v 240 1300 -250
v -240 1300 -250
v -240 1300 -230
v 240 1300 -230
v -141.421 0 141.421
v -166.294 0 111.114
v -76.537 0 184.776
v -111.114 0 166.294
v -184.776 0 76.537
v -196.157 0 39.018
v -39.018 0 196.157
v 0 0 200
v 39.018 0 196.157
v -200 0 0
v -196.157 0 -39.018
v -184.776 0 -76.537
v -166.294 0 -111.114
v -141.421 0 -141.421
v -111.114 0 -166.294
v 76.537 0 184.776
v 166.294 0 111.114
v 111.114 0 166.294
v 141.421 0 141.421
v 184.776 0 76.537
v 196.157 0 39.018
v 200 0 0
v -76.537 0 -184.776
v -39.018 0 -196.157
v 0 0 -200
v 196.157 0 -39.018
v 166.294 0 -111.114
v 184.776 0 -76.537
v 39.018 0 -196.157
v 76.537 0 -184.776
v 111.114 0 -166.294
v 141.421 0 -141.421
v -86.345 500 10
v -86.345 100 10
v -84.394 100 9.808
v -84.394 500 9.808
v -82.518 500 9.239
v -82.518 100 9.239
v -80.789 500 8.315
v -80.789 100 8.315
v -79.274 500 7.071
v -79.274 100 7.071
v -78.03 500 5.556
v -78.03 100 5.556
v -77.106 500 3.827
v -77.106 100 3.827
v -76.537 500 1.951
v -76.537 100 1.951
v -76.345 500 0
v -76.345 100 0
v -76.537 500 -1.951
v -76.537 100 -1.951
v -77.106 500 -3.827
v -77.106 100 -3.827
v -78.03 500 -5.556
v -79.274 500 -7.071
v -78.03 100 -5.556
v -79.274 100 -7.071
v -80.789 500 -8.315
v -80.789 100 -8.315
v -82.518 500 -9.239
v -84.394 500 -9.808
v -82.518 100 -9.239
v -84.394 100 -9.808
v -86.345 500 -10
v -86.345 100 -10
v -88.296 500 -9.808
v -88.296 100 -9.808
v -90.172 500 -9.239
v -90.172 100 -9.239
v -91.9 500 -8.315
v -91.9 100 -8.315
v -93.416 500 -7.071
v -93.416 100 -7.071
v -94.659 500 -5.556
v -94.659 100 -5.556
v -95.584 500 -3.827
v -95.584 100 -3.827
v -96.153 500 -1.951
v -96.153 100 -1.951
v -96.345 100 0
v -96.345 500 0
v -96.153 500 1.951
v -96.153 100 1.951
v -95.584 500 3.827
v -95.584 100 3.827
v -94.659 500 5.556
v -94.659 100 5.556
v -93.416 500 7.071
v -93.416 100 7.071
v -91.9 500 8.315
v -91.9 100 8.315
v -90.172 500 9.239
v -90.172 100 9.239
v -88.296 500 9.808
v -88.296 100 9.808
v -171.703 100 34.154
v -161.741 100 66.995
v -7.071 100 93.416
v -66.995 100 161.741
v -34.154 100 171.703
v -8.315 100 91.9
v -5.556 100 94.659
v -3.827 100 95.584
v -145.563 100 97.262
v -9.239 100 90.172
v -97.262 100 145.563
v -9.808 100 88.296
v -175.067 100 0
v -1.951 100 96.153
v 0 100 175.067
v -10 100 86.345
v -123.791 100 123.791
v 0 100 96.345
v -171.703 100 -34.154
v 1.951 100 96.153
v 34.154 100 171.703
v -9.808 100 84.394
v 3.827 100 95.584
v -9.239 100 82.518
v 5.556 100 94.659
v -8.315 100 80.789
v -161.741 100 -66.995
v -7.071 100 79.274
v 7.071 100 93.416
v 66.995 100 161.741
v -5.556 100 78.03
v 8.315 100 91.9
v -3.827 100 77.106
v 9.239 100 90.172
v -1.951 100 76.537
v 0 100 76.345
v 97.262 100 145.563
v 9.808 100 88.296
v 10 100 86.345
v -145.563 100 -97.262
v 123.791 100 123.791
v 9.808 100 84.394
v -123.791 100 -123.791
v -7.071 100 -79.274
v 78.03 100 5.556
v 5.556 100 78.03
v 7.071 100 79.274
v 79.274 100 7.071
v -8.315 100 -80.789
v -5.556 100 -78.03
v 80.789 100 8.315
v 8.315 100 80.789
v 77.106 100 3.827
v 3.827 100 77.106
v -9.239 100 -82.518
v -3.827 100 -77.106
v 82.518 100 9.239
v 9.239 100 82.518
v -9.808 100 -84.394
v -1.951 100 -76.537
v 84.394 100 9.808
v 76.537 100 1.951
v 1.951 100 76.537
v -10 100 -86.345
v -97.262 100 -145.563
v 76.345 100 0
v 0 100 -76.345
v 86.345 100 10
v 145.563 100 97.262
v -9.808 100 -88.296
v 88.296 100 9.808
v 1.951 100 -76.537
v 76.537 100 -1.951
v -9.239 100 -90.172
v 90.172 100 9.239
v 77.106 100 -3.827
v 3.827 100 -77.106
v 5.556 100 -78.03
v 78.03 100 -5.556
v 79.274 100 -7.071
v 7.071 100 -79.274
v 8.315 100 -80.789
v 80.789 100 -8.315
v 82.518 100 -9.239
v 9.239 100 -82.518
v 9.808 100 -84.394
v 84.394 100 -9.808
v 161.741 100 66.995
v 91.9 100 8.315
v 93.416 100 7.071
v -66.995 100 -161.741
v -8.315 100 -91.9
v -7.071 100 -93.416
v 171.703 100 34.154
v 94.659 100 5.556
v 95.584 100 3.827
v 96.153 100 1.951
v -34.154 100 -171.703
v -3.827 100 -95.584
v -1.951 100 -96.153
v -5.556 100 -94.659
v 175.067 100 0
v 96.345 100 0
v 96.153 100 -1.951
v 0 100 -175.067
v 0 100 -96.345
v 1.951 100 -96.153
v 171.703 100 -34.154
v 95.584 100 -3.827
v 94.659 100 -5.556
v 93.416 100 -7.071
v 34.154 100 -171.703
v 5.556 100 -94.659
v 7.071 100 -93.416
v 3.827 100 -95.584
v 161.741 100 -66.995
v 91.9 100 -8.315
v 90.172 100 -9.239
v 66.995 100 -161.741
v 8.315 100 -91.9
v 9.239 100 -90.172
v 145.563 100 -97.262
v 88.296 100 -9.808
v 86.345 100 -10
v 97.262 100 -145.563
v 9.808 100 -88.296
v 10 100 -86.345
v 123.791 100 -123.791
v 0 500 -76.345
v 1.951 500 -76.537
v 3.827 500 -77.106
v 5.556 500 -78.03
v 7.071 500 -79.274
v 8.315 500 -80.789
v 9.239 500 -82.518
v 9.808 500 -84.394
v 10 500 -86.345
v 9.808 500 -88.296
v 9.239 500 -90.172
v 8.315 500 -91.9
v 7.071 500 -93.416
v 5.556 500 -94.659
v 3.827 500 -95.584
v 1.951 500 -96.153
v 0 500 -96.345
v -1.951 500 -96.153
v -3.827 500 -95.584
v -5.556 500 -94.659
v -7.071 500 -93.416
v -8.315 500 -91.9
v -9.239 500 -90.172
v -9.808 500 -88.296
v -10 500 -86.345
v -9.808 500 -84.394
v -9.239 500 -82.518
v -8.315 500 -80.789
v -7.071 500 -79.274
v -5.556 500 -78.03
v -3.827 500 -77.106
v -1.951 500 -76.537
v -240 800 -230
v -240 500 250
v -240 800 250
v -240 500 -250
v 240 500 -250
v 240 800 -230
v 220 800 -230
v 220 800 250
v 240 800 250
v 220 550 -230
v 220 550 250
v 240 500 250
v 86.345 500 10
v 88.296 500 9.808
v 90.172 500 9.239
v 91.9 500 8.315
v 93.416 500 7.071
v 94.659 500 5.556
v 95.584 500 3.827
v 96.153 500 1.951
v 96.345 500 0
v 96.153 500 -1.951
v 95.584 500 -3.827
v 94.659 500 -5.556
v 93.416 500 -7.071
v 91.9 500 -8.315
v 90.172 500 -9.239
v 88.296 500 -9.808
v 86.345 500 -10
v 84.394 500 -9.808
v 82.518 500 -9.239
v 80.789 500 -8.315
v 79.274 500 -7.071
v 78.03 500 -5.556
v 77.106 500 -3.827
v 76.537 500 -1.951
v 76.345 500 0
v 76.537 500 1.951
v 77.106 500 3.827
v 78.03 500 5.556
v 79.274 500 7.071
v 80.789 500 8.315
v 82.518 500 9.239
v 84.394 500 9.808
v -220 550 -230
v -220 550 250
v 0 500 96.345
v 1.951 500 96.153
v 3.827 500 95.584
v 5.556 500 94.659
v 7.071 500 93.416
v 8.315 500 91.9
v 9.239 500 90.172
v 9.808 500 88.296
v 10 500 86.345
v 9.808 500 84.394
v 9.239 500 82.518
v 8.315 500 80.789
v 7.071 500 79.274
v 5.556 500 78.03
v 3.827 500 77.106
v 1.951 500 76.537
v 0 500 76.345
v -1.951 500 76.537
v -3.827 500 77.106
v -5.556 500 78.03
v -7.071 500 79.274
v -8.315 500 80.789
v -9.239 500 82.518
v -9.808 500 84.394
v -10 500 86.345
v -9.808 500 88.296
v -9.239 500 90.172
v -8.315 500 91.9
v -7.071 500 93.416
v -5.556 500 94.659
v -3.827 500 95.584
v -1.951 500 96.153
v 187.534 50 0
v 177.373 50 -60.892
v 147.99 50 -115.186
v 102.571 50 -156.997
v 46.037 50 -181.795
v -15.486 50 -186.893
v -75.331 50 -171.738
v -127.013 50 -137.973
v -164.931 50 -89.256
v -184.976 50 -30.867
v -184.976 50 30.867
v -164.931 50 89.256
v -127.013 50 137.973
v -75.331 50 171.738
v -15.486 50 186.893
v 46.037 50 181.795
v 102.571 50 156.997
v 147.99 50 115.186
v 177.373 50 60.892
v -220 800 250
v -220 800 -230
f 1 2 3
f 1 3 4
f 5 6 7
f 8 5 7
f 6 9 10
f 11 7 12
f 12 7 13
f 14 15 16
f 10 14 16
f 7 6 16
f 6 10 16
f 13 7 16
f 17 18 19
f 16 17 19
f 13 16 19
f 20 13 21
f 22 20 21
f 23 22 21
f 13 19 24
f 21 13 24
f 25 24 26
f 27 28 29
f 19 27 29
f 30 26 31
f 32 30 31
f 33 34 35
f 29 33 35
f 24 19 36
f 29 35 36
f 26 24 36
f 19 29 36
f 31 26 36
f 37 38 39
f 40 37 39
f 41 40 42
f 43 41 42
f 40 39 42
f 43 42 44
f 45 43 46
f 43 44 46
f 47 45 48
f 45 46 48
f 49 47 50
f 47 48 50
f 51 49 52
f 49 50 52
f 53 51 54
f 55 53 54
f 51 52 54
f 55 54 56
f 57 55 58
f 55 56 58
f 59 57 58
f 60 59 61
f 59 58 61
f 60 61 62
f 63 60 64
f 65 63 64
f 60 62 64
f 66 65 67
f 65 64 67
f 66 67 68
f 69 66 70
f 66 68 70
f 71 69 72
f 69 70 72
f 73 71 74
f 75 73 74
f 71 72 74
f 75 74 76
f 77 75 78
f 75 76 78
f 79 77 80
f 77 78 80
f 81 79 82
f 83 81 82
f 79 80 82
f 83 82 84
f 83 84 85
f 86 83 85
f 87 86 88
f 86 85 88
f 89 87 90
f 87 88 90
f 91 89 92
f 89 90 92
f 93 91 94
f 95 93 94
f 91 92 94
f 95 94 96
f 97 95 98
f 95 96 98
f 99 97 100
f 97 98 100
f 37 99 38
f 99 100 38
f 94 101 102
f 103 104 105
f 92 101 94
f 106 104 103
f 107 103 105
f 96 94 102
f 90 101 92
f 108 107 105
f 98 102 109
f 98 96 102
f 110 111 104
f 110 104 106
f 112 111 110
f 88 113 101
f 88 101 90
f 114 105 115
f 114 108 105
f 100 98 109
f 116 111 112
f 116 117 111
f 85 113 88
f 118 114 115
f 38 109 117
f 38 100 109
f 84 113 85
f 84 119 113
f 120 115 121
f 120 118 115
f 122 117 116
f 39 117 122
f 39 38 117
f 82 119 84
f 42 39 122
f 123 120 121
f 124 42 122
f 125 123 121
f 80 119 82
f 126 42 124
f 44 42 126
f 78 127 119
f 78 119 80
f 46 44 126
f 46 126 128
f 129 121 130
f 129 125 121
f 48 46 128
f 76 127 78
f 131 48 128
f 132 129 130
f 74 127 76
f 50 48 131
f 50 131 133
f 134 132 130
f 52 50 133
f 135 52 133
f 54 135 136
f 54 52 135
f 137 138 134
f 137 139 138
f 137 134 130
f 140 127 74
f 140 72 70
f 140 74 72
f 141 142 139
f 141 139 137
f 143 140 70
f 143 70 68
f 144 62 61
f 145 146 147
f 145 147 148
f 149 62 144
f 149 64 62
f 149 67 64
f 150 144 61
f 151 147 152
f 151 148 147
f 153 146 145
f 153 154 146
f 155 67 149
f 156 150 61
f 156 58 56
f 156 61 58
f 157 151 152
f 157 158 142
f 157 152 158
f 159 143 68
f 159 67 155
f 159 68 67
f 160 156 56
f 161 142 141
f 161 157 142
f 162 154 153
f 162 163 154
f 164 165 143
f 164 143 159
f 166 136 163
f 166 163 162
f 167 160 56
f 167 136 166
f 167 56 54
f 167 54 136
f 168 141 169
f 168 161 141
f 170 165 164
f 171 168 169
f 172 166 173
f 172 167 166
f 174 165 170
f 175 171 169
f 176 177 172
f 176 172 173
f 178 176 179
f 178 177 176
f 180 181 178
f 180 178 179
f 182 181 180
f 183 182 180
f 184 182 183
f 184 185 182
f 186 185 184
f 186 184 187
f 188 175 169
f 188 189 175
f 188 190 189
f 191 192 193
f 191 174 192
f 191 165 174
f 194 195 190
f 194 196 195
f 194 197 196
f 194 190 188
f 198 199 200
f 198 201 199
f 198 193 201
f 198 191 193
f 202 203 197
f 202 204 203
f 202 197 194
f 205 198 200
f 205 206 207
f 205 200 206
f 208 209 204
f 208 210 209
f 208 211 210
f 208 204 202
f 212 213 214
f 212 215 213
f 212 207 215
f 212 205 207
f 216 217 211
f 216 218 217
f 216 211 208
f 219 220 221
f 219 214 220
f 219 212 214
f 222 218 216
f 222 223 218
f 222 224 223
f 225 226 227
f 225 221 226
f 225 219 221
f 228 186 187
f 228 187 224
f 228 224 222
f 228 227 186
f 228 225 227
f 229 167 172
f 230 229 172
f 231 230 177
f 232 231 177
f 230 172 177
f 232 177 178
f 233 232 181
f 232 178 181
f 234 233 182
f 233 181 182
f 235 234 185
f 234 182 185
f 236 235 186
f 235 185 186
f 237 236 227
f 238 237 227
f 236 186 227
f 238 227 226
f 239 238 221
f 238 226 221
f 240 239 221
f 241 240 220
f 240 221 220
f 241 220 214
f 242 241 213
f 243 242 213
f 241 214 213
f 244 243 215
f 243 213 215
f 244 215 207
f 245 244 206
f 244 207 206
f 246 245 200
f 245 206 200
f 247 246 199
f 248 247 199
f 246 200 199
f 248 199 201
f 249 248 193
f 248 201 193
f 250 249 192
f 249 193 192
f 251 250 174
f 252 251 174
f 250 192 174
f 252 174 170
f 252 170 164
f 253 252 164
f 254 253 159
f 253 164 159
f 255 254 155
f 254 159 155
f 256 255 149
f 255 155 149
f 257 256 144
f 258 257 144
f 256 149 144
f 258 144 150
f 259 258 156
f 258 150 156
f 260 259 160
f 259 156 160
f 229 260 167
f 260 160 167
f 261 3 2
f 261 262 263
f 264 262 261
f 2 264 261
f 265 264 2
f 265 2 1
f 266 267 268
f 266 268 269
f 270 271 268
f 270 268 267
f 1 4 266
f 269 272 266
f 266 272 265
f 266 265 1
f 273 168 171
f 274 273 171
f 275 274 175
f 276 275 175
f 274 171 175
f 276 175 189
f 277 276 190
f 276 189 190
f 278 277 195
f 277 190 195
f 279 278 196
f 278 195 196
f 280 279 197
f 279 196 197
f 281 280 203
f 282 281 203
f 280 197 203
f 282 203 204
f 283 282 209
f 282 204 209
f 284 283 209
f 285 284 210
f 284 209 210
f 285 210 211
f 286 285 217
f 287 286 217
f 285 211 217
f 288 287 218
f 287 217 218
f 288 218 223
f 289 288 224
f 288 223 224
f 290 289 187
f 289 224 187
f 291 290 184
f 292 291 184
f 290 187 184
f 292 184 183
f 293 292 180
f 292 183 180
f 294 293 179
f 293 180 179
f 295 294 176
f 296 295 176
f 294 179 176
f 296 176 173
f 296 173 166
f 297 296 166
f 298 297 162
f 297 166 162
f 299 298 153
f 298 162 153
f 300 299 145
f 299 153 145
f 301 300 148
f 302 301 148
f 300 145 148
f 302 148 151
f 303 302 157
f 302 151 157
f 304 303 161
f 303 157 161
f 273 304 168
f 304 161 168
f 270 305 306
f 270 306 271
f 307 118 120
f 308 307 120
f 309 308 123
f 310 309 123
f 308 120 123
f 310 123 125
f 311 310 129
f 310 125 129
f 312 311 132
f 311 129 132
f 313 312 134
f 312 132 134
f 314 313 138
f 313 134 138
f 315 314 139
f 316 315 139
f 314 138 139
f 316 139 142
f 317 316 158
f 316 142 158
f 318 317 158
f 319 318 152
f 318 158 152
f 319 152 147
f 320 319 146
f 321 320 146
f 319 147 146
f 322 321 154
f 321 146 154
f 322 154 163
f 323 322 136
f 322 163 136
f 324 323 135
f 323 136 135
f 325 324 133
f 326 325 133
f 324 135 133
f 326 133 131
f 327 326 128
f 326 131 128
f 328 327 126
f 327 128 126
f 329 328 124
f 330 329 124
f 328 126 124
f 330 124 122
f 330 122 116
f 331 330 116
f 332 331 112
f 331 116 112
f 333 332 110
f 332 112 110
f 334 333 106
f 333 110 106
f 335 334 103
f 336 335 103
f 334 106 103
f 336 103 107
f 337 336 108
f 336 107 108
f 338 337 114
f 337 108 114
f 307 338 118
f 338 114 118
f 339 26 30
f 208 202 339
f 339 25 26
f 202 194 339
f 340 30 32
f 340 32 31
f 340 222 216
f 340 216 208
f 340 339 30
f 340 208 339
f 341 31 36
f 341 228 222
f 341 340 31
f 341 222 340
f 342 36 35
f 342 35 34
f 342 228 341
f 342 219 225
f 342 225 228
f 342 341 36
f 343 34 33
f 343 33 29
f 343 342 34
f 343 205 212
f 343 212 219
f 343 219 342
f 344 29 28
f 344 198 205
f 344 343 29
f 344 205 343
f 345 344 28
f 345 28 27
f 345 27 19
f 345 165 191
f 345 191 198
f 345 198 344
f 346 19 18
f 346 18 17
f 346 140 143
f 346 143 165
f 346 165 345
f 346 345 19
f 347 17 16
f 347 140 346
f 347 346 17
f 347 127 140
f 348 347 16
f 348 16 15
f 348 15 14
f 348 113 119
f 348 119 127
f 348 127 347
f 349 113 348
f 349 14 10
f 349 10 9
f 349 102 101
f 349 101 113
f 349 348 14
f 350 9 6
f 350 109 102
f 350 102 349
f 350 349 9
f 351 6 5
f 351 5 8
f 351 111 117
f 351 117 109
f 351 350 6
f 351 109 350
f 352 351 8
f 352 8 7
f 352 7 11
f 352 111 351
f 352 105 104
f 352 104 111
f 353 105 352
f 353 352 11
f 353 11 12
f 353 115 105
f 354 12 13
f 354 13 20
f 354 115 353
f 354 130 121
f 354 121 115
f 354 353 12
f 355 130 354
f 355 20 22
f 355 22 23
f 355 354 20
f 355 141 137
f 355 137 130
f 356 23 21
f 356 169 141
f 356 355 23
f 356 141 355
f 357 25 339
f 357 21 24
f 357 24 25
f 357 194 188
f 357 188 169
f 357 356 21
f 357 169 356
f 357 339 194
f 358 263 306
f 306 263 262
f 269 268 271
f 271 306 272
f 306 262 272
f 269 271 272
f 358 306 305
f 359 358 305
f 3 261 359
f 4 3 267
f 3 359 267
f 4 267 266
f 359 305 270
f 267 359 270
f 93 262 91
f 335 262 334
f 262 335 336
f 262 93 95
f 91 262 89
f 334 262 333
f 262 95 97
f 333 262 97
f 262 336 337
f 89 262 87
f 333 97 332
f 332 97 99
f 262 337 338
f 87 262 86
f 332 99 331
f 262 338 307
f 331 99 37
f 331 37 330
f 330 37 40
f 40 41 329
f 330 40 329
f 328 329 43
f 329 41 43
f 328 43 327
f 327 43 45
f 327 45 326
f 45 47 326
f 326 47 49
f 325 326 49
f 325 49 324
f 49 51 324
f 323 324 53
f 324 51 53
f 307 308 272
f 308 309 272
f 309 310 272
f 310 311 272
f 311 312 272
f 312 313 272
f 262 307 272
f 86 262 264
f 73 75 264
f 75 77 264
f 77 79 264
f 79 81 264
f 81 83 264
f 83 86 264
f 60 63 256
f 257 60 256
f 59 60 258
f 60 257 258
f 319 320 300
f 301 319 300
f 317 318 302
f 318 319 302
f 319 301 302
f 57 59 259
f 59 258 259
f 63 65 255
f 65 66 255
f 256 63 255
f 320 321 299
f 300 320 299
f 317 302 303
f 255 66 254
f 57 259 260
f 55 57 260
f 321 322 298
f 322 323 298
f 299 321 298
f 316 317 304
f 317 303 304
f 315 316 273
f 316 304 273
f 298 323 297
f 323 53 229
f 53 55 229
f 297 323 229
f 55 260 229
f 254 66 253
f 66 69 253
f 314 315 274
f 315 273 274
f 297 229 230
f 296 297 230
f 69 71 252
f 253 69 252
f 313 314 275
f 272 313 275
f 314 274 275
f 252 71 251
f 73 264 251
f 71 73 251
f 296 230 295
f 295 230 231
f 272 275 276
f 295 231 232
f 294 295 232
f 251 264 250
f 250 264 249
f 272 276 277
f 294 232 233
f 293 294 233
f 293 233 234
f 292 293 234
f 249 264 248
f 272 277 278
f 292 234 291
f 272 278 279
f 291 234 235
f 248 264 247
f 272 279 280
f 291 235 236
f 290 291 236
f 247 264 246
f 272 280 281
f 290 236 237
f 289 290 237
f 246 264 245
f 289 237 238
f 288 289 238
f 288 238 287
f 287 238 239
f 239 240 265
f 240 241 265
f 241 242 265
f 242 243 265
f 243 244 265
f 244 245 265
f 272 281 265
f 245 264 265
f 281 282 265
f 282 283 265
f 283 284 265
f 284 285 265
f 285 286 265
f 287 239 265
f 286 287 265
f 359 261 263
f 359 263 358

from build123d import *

# Parameters (mm, degrees)
SKETCH1_R            = 200
BOSS_EXTRUDE1_DEPTH  = 100
BOSS_EXTRUDE1_TAPER  = 14
SKETCH2_R            = 10
BOSS_EXTRUDE2_DEPTH  = 400
SKETCH7_W            = 480
SKETCH7_H            = 500
BOSS_EXTRUDE8_DEPTH  = 50
SKETCH8_W            = 480
SKETCH8_H            = 20
BOSS_EXTRUDE9_DEPTH  = 750
SKETCH9_W            = 20
SKETCH9_H            = 480
BOSS_EXTRUDE10_DEPTH = 250


with BuildPart() as part:
    # Sketch1 → Boss-Extrude1 (new body)
    with BuildSketch(Plane(origin=(0, 0, 0), x_dir=(1, 0, 0), z_dir=(0, 1, 0))):
        Circle(SKETCH1_R)
    extrude(amount=BOSS_EXTRUDE1_DEPTH, taper=BOSS_EXTRUDE1_TAPER)

    # Sketch2 → Boss-Extrude2 (add)
    with BuildSketch(Plane(origin=(0, 100, 0), x_dir=(1, 0, 0), z_dir=(0, 1, 0))):
        with Locations(Location((86.344755042, 0, 0), (0, 0, 270))):
            Circle(SKETCH2_R)
        with Locations(Location((0, -86.344755042, 0), (0, 0, 270))):
            Circle(SKETCH2_R)
        with Locations(Location((-86.344755042, 0, 0), (0, 0, 270))):
            Circle(SKETCH2_R)
        with Locations(Location((0, 86.344755042, 0), (0, 0, 270))):
            Circle(SKETCH2_R)
    extrude(amount=BOSS_EXTRUDE2_DEPTH)

    # Sketch7 → Boss-Extrude8 (add)
    with BuildSketch(Plane(origin=(0, 500, 0), x_dir=(1, 0, 0), z_dir=(0, 1, 0))):
        Rectangle(SKETCH7_W, SKETCH7_H)
    extrude(amount=BOSS_EXTRUDE8_DEPTH)

    # Sketch8 → Boss-Extrude9 (add)
    with BuildSketch(Plane(origin=(0, 550, 0), x_dir=(1, 0, 0), z_dir=(0, 1, 0))):
        with Locations((0, 240)):
            Rectangle(SKETCH8_W, SKETCH8_H)
    extrude(amount=BOSS_EXTRUDE9_DEPTH)

    # Sketch9 → Boss-Extrude10 (add)
    with BuildSketch(Plane(origin=(0, 550, 0), x_dir=(1, 0, 0), z_dir=(0, 1, 0))):
        with Locations((-230, -10)):
            Rectangle(SKETCH9_W, SKETCH9_H)
        with Locations((230, -10)):
            Rectangle(SKETCH9_W, SKETCH9_H)
    extrude(amount=BOSS_EXTRUDE10_DEPTH)


solid = part.part
